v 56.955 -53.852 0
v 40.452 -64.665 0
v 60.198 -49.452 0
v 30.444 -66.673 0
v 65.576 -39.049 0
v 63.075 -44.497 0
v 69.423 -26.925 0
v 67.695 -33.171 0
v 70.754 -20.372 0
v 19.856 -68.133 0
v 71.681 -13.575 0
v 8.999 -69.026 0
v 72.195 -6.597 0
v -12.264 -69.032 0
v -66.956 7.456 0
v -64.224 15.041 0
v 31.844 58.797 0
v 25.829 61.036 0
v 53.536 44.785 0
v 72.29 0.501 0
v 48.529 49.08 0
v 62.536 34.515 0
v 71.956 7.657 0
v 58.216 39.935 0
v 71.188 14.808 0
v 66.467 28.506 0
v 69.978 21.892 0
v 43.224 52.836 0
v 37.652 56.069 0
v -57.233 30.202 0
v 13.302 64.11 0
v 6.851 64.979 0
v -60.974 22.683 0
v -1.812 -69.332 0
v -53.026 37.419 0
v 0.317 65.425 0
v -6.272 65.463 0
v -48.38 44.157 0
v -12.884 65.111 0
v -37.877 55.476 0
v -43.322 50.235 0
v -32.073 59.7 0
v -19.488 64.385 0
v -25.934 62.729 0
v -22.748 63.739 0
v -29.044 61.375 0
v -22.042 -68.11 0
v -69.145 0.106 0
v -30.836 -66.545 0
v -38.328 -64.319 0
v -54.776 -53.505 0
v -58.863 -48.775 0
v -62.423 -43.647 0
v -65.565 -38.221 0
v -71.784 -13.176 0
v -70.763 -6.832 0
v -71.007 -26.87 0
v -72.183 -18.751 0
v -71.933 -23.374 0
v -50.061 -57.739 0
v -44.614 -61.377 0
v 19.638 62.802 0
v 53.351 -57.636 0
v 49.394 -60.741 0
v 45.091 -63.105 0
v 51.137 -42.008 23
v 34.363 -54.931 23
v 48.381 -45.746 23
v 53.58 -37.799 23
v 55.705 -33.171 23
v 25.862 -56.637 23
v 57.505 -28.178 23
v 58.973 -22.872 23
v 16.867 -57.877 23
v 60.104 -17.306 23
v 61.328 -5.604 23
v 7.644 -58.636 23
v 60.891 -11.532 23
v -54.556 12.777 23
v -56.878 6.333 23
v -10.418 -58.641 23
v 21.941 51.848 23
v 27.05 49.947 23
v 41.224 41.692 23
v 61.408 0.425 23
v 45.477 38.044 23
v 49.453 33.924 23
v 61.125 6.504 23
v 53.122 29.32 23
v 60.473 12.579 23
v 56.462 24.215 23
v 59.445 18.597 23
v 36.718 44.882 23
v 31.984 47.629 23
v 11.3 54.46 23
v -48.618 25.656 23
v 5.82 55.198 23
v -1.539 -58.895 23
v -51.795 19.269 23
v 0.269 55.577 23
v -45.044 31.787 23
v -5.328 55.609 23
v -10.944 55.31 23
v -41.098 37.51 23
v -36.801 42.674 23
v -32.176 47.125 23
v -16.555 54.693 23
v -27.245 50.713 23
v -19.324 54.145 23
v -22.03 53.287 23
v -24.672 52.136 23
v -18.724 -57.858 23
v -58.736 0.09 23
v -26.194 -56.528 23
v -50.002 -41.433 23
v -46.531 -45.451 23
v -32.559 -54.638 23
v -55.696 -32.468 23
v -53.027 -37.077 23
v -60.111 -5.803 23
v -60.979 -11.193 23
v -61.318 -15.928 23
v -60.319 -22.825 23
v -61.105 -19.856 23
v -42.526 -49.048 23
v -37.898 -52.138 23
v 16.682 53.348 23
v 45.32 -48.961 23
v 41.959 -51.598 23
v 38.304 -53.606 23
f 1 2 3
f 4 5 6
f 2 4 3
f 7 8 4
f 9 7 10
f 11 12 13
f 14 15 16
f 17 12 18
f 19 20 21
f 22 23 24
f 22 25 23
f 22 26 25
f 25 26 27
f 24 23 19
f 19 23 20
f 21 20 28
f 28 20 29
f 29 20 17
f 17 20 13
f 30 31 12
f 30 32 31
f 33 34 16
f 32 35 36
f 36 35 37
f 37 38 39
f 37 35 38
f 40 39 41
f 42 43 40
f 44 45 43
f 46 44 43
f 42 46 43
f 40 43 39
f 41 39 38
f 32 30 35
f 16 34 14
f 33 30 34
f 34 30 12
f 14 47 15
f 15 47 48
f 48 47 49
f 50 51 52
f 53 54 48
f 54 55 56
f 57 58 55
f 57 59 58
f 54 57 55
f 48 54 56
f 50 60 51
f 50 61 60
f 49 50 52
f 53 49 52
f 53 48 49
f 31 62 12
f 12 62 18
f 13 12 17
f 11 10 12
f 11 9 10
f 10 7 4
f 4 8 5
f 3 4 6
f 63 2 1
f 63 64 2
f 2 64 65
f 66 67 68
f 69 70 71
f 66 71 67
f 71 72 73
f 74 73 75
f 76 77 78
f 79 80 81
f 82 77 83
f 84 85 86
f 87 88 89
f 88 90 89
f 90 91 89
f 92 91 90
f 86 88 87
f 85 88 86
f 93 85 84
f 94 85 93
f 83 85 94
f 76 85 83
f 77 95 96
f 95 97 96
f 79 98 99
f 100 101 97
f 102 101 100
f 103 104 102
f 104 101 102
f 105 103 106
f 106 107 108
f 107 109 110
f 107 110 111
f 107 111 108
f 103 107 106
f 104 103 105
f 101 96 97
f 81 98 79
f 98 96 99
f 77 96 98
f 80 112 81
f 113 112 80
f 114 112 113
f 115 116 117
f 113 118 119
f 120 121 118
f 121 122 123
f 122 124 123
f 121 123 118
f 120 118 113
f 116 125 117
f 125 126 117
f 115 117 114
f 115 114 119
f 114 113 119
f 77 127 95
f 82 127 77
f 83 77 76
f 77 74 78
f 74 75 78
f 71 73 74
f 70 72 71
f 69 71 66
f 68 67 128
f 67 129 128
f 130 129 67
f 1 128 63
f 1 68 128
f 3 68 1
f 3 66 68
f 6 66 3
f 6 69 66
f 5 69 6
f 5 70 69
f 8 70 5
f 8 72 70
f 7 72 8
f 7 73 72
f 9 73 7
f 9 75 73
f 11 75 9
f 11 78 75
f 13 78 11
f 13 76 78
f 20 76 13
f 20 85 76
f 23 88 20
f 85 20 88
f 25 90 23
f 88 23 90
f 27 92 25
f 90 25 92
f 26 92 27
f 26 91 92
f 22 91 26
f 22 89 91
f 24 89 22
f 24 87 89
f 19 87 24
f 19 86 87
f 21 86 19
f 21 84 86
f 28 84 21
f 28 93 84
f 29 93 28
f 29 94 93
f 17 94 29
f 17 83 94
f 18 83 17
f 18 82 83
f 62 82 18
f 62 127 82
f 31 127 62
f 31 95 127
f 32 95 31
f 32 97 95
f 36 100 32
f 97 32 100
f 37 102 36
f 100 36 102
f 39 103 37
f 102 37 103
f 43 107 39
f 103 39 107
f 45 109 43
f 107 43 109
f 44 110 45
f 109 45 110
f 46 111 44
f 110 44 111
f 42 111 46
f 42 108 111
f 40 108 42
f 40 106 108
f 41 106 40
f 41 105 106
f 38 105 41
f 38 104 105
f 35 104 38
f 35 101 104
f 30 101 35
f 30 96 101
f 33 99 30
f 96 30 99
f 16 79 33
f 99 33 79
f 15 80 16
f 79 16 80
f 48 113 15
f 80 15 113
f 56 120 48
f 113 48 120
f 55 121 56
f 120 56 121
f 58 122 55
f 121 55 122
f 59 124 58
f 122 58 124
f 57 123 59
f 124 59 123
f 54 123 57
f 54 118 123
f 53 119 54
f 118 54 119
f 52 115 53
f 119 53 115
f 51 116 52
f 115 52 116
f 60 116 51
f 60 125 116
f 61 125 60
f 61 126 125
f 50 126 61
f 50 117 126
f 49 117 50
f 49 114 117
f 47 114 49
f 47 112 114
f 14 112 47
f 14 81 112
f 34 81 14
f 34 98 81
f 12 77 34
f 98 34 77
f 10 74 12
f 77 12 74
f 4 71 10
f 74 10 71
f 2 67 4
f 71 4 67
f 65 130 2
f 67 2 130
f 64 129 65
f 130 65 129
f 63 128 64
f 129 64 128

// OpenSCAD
// file: hillpolygon.scad
module hillFromPolygon(height = 23, angle = 30, convexity = 5) {
   $fn = 100;

   // estRadius calculates an estimated radius for the hill assuming that I've filled most of the
   // depth of the build plate (Y dimension) with the polygon. This is then used to scale the roof of
   // the polyhedral.
   estRadius = 0.95 * 150 / 2;
   inset = height * tan(angle);
   scaleFactor = (estRadius - inset) / estRadius;

   linear_extrude(height = height, convexity = convexity, scale=scaleFactor) child(0);
}
// main file
use <hillpolygon.scad>;

% translate([0,0,155/2]) cube(size=[240, 153, 155], center=true);

hill5();

module hill5() {
   hillFromPolygon(angle=25) hill5Polygon();
}

module hill5Polygon() {
	rotate([0,0,30]) translate([55,-15,0])
  polygon(points=
    [[-39.685, 80.503], [-33.602, 77.830], [-27.700, 74.829], [-22.013, 71.501], [-16.577, 67.848], [-11.425, 63.870], [-6.592, 59.569], [-2.114, 54.944], [1.976, 49.998], [5.642, 44.731], [8.851, 39.145], [11.567, 33.240], [13.756, 27.017], [15.384, 20.477], [16.415, 13.623], [16.815, 6.453], [16.549, -1.030], [14.055, -7.770], [11.144, -14.347], [7.855, -20.711], [4.224, -26.811], [0.290, -32.597], [-3.911, -38.020], [-8.340, -43.029], [-12.960, -47.574], [-17.734, -51.605], [-22.624, -55.073], [-27.593, -57.926], [-32.602, -60.115], [-37.615, -61.590], [-42.594, -62.300], [-47.502, -62.196], [-52.300, -61.228], [-61.971, -57.963], [-71.871, -53.933], [-81.720, -49.278], [-91.235, -44.137], [-100.137, -38.652], [-108.144, -32.964], [-114.977, -27.212], [-120.353, -21.538], [-124.325, -15.847], [-127.224, -9.973], [-129.190, -3.949], [-130.364, 2.191], [-130.884, 8.412], [-130.892, 14.682], [-129.929, 27.234], [-128.983, 30.724], [-126.888, 34.853], [-123.755, 39.481], [-119.698, 44.465], [-114.828, 49.664], [-109.258, 54.935], [-103.099, 60.138], [-96.463, 65.131], [-89.464, 69.772], [-82.212, 73.919], [-74.820, 77.431], [-67.400, 80.166], [-60.065, 81.982], [-52.926, 82.738], [-49.465, 82.674], [-46.095, 82.292], [-42.831, 81.574]]
    , paths=
    [[0, 1, 2, 3, 4, 5, 6, 7, 8, 9, 10, 11, 12, 13, 14, 15, 16, 17, 18, 19, 20, 21, 22, 23, 24, 25, 26, 27, 28, 29, 30, 31, 32, 33, 34, 35, 36, 37, 38, 39, 40, 41, 42, 43, 44, 45, 46, 47, 48, 49, 50, 51, 52, 53, 54, 55, 56, 57, 58, 59, 60, 61, 62, 63, 64, 0, 0]]
    );
}
